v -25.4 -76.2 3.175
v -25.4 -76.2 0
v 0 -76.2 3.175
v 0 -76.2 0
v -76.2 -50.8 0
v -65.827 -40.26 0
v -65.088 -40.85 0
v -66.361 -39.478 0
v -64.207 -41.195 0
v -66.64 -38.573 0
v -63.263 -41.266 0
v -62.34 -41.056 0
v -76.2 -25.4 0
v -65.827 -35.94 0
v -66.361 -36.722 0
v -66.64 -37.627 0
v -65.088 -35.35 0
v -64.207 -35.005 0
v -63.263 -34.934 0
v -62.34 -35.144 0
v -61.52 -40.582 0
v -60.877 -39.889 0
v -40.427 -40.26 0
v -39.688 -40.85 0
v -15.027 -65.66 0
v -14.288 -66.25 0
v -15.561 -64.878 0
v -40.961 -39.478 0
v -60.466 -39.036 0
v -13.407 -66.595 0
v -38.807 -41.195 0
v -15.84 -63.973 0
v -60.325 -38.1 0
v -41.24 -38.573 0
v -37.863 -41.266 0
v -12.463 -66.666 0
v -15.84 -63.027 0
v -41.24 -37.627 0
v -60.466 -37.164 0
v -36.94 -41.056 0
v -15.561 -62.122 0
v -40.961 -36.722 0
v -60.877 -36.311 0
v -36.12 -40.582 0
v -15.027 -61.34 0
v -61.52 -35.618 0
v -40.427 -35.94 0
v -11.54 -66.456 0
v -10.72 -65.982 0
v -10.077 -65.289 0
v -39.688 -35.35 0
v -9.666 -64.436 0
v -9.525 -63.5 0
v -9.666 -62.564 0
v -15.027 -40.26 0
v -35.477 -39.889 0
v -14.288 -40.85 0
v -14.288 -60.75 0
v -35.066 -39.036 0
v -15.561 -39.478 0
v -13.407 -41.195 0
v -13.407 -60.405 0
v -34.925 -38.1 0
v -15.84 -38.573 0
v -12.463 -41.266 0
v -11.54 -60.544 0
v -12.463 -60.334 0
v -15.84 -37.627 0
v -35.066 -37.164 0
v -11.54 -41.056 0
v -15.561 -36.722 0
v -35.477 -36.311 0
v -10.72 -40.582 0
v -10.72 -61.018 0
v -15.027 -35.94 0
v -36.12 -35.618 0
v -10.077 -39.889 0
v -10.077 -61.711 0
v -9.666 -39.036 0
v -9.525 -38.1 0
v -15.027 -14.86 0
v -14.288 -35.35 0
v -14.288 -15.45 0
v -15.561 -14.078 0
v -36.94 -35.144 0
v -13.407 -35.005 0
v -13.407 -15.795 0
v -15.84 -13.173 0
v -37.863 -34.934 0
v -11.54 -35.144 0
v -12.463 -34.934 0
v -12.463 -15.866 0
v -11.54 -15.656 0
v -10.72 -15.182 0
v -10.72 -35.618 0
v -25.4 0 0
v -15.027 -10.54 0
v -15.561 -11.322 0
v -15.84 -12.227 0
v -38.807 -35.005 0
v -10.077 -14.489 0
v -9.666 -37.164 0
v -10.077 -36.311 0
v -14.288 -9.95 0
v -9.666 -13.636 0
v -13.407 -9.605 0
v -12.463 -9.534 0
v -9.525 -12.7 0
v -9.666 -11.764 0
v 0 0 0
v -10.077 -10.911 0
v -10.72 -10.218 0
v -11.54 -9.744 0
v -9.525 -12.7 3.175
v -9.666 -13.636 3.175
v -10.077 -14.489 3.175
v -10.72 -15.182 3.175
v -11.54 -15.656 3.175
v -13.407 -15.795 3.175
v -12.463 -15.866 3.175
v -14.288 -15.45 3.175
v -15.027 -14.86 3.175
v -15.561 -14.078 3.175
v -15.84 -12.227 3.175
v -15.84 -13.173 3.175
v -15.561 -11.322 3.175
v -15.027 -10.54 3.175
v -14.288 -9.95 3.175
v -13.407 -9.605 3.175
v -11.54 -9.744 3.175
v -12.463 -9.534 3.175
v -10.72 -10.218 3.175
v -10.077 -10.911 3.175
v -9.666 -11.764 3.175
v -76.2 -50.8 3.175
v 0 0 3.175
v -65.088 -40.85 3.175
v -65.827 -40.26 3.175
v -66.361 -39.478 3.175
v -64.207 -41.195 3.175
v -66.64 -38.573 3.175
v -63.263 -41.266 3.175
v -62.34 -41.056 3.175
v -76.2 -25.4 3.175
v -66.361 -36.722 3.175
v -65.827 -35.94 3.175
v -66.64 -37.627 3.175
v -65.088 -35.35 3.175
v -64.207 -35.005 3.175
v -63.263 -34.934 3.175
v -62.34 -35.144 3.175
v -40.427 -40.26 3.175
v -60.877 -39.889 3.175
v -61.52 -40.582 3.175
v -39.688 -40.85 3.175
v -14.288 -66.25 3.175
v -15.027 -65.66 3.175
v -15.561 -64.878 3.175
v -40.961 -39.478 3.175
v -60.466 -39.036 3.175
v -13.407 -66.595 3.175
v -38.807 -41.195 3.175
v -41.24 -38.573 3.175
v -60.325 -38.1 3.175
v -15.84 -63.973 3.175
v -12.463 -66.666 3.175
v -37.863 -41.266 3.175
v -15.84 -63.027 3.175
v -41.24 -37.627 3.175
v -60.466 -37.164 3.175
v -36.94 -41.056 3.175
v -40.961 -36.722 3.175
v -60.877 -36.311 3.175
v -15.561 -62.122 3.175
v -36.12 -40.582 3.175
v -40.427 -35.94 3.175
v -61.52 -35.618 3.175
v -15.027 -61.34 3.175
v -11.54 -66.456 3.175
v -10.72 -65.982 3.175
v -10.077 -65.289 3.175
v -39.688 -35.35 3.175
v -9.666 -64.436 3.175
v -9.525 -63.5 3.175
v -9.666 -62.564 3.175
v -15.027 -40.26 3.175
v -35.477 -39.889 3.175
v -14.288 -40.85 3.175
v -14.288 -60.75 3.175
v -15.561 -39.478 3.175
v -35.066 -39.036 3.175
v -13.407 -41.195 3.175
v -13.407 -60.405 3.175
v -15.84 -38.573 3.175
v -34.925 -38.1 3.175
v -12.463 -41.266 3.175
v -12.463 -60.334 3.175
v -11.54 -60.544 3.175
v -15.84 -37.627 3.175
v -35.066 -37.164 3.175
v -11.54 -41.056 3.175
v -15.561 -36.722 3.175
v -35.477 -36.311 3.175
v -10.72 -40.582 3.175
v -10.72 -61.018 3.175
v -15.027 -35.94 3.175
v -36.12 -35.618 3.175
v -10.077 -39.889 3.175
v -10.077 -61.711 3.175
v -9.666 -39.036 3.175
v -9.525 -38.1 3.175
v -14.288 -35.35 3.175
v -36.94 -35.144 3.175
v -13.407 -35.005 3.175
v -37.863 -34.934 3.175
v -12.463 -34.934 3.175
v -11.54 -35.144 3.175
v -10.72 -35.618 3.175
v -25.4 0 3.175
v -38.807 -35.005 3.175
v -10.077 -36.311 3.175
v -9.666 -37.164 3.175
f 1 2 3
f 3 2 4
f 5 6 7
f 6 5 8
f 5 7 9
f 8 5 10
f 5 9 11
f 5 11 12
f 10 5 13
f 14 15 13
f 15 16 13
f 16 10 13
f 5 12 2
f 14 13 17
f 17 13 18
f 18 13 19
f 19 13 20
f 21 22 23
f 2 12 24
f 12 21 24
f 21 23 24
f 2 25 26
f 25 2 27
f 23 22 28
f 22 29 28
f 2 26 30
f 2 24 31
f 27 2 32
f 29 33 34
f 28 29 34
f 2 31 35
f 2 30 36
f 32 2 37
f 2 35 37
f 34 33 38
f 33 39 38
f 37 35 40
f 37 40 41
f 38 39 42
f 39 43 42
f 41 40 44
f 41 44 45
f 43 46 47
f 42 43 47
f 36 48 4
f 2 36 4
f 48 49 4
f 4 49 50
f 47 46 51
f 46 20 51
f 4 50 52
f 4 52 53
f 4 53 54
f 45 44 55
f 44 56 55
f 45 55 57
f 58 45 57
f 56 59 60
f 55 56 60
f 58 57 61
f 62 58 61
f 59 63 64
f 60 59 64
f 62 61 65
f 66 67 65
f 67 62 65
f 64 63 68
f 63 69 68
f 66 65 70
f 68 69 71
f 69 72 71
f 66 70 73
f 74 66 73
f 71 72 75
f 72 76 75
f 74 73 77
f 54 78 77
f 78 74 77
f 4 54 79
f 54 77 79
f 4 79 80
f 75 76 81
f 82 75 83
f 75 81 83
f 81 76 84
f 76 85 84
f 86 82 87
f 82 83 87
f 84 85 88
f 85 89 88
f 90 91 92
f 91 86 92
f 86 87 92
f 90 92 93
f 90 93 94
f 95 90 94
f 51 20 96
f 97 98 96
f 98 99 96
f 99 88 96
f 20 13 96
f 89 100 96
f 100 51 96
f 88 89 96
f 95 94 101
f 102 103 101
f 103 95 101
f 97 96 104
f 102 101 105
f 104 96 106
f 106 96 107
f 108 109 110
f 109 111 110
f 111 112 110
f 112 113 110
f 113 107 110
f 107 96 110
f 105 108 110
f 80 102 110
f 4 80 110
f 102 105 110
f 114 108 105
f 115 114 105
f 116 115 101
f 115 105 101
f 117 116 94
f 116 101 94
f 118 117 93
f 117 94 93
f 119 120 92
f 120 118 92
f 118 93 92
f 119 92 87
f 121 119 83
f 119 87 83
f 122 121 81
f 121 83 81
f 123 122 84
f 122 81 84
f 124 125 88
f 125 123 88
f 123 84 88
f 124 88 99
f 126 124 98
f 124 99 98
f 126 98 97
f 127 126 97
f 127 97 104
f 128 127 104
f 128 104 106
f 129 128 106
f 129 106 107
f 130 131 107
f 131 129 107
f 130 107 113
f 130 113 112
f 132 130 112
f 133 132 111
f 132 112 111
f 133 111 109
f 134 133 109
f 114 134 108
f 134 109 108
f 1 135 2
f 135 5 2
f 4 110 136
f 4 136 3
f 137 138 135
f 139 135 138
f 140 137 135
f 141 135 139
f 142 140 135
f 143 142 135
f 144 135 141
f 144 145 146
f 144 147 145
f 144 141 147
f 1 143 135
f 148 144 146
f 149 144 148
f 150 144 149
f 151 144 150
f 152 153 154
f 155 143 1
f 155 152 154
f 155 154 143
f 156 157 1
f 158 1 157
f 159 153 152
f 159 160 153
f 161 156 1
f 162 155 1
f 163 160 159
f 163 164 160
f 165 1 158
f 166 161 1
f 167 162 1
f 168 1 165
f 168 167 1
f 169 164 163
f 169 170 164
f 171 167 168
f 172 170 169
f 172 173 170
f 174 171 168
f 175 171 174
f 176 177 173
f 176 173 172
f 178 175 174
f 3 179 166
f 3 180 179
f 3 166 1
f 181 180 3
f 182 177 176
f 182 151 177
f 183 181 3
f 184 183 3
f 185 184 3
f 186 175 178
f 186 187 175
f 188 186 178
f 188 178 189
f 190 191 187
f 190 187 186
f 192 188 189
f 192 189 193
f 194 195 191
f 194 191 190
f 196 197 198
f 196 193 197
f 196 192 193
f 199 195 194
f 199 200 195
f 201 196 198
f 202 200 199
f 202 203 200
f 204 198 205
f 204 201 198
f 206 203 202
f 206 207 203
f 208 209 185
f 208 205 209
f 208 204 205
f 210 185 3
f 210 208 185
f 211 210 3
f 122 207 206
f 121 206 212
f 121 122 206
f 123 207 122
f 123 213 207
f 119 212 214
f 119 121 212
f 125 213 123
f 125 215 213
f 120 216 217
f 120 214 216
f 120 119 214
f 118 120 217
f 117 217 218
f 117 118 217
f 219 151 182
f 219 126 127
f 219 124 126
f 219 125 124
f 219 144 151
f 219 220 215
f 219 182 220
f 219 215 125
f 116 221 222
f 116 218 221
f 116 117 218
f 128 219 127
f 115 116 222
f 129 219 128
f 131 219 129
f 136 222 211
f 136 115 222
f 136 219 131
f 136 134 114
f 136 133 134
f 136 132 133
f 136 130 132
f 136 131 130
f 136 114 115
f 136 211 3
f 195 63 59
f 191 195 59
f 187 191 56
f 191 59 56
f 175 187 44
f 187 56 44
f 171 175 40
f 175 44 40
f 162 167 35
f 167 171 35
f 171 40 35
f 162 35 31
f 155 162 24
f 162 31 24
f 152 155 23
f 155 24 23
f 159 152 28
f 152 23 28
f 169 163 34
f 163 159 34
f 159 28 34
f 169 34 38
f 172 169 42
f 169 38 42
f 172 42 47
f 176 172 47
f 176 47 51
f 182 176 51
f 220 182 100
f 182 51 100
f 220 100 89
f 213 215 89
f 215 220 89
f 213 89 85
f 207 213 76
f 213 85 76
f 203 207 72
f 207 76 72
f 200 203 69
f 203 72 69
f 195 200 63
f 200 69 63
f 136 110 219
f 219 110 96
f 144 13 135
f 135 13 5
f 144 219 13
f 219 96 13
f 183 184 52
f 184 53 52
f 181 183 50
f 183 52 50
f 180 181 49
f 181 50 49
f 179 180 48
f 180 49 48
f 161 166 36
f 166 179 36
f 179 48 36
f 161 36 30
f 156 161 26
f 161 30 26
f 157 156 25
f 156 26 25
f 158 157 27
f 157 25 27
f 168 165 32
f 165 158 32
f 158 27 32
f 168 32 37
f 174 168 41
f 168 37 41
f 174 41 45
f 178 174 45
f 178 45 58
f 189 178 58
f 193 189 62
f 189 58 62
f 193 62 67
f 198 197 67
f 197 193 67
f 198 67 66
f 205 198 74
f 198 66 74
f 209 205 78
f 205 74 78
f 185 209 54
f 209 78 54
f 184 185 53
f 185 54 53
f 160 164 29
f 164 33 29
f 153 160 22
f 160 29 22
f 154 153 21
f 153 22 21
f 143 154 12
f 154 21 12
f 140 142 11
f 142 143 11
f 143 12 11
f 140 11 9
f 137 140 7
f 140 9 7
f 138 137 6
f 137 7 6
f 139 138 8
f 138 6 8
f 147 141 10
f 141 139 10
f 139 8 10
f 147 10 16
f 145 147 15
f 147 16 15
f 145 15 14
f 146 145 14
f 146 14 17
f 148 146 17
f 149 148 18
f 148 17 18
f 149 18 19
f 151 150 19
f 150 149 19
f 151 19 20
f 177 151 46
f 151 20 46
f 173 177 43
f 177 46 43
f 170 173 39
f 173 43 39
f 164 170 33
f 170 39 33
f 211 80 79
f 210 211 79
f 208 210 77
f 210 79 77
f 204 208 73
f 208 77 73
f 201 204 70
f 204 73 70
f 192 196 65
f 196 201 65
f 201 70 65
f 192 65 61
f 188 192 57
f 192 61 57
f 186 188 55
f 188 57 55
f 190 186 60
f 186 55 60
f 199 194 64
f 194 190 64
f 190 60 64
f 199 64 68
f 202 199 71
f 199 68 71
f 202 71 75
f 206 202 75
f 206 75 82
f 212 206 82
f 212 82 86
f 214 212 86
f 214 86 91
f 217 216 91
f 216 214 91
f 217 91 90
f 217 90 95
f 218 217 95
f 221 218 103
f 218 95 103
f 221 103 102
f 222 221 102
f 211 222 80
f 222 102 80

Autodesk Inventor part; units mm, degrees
ref_plane "YZ Plane" through (0, 0, 0) normal (1, 0, 0) x (0, 1, 0)
ref_plane "XZ Plane" through (0, 0, 0) normal (0, 1, 0) x (-1, 0, 0)
ref_plane "XY Plane" through (0, 0, 0) normal (0, 0, 1) x (1, 0, 0)
sketch "Sketch1" plane through (0, 0, 0) normal (0, 0, 1) x (1, 0, 0)
  line L0 (0, 0) -> (0, -76.2)
  line L1 (0, 0) -> (76.2, 0) construction
  line L2 (0, 0) -> (-25.4, 0)
  line L3 (-25.4, 0) -> (-76.2, -25.4)
  line L4 (-76.2, -25.4) -> (-76.2, -50.8)
  line L5 (-76.2, -50.8) -> (-25.4, -76.2)
  line L6 (-25.4, -76.2) -> (0, -76.2)
  circle A0 centre (-12.7, -12.7) radius 3.175
  circle A1 centre (-12.7, -38.1) radius 3.175
  circle A2 centre (-12.7, -63.5) radius 3.175
  circle A3 centre (-38.1, -38.1) radius 3.175
  circle A4 centre (-63.5, -38.1) radius 3.175
  dimension "d0" = 76.2
  dimension "d2" = 25.4
  dimension "d3" = 25.4
  dimension "d4" = 25.4
  dimension "d5" = 76.2
  dimension "d6" = 6.35
  dimension "d7" = 12.7
  dimension "d8" = 12.7
  dimension "d9" = 12.7
  dimension "d10" = 38.1
  dimension "d11" = 25.4
  dimension "d12" = 25.4
  dimension "d13" = 12.7
  dimension "d14" = 12.7
  dimension "d15" = 12.7
  dimension "d16" = 12.7
extrude "Extrusion1" add sketch "Sketch1" along normal blind 3.175
properties part number "15102898-16-P-0210" material "Aluminum 6061"
